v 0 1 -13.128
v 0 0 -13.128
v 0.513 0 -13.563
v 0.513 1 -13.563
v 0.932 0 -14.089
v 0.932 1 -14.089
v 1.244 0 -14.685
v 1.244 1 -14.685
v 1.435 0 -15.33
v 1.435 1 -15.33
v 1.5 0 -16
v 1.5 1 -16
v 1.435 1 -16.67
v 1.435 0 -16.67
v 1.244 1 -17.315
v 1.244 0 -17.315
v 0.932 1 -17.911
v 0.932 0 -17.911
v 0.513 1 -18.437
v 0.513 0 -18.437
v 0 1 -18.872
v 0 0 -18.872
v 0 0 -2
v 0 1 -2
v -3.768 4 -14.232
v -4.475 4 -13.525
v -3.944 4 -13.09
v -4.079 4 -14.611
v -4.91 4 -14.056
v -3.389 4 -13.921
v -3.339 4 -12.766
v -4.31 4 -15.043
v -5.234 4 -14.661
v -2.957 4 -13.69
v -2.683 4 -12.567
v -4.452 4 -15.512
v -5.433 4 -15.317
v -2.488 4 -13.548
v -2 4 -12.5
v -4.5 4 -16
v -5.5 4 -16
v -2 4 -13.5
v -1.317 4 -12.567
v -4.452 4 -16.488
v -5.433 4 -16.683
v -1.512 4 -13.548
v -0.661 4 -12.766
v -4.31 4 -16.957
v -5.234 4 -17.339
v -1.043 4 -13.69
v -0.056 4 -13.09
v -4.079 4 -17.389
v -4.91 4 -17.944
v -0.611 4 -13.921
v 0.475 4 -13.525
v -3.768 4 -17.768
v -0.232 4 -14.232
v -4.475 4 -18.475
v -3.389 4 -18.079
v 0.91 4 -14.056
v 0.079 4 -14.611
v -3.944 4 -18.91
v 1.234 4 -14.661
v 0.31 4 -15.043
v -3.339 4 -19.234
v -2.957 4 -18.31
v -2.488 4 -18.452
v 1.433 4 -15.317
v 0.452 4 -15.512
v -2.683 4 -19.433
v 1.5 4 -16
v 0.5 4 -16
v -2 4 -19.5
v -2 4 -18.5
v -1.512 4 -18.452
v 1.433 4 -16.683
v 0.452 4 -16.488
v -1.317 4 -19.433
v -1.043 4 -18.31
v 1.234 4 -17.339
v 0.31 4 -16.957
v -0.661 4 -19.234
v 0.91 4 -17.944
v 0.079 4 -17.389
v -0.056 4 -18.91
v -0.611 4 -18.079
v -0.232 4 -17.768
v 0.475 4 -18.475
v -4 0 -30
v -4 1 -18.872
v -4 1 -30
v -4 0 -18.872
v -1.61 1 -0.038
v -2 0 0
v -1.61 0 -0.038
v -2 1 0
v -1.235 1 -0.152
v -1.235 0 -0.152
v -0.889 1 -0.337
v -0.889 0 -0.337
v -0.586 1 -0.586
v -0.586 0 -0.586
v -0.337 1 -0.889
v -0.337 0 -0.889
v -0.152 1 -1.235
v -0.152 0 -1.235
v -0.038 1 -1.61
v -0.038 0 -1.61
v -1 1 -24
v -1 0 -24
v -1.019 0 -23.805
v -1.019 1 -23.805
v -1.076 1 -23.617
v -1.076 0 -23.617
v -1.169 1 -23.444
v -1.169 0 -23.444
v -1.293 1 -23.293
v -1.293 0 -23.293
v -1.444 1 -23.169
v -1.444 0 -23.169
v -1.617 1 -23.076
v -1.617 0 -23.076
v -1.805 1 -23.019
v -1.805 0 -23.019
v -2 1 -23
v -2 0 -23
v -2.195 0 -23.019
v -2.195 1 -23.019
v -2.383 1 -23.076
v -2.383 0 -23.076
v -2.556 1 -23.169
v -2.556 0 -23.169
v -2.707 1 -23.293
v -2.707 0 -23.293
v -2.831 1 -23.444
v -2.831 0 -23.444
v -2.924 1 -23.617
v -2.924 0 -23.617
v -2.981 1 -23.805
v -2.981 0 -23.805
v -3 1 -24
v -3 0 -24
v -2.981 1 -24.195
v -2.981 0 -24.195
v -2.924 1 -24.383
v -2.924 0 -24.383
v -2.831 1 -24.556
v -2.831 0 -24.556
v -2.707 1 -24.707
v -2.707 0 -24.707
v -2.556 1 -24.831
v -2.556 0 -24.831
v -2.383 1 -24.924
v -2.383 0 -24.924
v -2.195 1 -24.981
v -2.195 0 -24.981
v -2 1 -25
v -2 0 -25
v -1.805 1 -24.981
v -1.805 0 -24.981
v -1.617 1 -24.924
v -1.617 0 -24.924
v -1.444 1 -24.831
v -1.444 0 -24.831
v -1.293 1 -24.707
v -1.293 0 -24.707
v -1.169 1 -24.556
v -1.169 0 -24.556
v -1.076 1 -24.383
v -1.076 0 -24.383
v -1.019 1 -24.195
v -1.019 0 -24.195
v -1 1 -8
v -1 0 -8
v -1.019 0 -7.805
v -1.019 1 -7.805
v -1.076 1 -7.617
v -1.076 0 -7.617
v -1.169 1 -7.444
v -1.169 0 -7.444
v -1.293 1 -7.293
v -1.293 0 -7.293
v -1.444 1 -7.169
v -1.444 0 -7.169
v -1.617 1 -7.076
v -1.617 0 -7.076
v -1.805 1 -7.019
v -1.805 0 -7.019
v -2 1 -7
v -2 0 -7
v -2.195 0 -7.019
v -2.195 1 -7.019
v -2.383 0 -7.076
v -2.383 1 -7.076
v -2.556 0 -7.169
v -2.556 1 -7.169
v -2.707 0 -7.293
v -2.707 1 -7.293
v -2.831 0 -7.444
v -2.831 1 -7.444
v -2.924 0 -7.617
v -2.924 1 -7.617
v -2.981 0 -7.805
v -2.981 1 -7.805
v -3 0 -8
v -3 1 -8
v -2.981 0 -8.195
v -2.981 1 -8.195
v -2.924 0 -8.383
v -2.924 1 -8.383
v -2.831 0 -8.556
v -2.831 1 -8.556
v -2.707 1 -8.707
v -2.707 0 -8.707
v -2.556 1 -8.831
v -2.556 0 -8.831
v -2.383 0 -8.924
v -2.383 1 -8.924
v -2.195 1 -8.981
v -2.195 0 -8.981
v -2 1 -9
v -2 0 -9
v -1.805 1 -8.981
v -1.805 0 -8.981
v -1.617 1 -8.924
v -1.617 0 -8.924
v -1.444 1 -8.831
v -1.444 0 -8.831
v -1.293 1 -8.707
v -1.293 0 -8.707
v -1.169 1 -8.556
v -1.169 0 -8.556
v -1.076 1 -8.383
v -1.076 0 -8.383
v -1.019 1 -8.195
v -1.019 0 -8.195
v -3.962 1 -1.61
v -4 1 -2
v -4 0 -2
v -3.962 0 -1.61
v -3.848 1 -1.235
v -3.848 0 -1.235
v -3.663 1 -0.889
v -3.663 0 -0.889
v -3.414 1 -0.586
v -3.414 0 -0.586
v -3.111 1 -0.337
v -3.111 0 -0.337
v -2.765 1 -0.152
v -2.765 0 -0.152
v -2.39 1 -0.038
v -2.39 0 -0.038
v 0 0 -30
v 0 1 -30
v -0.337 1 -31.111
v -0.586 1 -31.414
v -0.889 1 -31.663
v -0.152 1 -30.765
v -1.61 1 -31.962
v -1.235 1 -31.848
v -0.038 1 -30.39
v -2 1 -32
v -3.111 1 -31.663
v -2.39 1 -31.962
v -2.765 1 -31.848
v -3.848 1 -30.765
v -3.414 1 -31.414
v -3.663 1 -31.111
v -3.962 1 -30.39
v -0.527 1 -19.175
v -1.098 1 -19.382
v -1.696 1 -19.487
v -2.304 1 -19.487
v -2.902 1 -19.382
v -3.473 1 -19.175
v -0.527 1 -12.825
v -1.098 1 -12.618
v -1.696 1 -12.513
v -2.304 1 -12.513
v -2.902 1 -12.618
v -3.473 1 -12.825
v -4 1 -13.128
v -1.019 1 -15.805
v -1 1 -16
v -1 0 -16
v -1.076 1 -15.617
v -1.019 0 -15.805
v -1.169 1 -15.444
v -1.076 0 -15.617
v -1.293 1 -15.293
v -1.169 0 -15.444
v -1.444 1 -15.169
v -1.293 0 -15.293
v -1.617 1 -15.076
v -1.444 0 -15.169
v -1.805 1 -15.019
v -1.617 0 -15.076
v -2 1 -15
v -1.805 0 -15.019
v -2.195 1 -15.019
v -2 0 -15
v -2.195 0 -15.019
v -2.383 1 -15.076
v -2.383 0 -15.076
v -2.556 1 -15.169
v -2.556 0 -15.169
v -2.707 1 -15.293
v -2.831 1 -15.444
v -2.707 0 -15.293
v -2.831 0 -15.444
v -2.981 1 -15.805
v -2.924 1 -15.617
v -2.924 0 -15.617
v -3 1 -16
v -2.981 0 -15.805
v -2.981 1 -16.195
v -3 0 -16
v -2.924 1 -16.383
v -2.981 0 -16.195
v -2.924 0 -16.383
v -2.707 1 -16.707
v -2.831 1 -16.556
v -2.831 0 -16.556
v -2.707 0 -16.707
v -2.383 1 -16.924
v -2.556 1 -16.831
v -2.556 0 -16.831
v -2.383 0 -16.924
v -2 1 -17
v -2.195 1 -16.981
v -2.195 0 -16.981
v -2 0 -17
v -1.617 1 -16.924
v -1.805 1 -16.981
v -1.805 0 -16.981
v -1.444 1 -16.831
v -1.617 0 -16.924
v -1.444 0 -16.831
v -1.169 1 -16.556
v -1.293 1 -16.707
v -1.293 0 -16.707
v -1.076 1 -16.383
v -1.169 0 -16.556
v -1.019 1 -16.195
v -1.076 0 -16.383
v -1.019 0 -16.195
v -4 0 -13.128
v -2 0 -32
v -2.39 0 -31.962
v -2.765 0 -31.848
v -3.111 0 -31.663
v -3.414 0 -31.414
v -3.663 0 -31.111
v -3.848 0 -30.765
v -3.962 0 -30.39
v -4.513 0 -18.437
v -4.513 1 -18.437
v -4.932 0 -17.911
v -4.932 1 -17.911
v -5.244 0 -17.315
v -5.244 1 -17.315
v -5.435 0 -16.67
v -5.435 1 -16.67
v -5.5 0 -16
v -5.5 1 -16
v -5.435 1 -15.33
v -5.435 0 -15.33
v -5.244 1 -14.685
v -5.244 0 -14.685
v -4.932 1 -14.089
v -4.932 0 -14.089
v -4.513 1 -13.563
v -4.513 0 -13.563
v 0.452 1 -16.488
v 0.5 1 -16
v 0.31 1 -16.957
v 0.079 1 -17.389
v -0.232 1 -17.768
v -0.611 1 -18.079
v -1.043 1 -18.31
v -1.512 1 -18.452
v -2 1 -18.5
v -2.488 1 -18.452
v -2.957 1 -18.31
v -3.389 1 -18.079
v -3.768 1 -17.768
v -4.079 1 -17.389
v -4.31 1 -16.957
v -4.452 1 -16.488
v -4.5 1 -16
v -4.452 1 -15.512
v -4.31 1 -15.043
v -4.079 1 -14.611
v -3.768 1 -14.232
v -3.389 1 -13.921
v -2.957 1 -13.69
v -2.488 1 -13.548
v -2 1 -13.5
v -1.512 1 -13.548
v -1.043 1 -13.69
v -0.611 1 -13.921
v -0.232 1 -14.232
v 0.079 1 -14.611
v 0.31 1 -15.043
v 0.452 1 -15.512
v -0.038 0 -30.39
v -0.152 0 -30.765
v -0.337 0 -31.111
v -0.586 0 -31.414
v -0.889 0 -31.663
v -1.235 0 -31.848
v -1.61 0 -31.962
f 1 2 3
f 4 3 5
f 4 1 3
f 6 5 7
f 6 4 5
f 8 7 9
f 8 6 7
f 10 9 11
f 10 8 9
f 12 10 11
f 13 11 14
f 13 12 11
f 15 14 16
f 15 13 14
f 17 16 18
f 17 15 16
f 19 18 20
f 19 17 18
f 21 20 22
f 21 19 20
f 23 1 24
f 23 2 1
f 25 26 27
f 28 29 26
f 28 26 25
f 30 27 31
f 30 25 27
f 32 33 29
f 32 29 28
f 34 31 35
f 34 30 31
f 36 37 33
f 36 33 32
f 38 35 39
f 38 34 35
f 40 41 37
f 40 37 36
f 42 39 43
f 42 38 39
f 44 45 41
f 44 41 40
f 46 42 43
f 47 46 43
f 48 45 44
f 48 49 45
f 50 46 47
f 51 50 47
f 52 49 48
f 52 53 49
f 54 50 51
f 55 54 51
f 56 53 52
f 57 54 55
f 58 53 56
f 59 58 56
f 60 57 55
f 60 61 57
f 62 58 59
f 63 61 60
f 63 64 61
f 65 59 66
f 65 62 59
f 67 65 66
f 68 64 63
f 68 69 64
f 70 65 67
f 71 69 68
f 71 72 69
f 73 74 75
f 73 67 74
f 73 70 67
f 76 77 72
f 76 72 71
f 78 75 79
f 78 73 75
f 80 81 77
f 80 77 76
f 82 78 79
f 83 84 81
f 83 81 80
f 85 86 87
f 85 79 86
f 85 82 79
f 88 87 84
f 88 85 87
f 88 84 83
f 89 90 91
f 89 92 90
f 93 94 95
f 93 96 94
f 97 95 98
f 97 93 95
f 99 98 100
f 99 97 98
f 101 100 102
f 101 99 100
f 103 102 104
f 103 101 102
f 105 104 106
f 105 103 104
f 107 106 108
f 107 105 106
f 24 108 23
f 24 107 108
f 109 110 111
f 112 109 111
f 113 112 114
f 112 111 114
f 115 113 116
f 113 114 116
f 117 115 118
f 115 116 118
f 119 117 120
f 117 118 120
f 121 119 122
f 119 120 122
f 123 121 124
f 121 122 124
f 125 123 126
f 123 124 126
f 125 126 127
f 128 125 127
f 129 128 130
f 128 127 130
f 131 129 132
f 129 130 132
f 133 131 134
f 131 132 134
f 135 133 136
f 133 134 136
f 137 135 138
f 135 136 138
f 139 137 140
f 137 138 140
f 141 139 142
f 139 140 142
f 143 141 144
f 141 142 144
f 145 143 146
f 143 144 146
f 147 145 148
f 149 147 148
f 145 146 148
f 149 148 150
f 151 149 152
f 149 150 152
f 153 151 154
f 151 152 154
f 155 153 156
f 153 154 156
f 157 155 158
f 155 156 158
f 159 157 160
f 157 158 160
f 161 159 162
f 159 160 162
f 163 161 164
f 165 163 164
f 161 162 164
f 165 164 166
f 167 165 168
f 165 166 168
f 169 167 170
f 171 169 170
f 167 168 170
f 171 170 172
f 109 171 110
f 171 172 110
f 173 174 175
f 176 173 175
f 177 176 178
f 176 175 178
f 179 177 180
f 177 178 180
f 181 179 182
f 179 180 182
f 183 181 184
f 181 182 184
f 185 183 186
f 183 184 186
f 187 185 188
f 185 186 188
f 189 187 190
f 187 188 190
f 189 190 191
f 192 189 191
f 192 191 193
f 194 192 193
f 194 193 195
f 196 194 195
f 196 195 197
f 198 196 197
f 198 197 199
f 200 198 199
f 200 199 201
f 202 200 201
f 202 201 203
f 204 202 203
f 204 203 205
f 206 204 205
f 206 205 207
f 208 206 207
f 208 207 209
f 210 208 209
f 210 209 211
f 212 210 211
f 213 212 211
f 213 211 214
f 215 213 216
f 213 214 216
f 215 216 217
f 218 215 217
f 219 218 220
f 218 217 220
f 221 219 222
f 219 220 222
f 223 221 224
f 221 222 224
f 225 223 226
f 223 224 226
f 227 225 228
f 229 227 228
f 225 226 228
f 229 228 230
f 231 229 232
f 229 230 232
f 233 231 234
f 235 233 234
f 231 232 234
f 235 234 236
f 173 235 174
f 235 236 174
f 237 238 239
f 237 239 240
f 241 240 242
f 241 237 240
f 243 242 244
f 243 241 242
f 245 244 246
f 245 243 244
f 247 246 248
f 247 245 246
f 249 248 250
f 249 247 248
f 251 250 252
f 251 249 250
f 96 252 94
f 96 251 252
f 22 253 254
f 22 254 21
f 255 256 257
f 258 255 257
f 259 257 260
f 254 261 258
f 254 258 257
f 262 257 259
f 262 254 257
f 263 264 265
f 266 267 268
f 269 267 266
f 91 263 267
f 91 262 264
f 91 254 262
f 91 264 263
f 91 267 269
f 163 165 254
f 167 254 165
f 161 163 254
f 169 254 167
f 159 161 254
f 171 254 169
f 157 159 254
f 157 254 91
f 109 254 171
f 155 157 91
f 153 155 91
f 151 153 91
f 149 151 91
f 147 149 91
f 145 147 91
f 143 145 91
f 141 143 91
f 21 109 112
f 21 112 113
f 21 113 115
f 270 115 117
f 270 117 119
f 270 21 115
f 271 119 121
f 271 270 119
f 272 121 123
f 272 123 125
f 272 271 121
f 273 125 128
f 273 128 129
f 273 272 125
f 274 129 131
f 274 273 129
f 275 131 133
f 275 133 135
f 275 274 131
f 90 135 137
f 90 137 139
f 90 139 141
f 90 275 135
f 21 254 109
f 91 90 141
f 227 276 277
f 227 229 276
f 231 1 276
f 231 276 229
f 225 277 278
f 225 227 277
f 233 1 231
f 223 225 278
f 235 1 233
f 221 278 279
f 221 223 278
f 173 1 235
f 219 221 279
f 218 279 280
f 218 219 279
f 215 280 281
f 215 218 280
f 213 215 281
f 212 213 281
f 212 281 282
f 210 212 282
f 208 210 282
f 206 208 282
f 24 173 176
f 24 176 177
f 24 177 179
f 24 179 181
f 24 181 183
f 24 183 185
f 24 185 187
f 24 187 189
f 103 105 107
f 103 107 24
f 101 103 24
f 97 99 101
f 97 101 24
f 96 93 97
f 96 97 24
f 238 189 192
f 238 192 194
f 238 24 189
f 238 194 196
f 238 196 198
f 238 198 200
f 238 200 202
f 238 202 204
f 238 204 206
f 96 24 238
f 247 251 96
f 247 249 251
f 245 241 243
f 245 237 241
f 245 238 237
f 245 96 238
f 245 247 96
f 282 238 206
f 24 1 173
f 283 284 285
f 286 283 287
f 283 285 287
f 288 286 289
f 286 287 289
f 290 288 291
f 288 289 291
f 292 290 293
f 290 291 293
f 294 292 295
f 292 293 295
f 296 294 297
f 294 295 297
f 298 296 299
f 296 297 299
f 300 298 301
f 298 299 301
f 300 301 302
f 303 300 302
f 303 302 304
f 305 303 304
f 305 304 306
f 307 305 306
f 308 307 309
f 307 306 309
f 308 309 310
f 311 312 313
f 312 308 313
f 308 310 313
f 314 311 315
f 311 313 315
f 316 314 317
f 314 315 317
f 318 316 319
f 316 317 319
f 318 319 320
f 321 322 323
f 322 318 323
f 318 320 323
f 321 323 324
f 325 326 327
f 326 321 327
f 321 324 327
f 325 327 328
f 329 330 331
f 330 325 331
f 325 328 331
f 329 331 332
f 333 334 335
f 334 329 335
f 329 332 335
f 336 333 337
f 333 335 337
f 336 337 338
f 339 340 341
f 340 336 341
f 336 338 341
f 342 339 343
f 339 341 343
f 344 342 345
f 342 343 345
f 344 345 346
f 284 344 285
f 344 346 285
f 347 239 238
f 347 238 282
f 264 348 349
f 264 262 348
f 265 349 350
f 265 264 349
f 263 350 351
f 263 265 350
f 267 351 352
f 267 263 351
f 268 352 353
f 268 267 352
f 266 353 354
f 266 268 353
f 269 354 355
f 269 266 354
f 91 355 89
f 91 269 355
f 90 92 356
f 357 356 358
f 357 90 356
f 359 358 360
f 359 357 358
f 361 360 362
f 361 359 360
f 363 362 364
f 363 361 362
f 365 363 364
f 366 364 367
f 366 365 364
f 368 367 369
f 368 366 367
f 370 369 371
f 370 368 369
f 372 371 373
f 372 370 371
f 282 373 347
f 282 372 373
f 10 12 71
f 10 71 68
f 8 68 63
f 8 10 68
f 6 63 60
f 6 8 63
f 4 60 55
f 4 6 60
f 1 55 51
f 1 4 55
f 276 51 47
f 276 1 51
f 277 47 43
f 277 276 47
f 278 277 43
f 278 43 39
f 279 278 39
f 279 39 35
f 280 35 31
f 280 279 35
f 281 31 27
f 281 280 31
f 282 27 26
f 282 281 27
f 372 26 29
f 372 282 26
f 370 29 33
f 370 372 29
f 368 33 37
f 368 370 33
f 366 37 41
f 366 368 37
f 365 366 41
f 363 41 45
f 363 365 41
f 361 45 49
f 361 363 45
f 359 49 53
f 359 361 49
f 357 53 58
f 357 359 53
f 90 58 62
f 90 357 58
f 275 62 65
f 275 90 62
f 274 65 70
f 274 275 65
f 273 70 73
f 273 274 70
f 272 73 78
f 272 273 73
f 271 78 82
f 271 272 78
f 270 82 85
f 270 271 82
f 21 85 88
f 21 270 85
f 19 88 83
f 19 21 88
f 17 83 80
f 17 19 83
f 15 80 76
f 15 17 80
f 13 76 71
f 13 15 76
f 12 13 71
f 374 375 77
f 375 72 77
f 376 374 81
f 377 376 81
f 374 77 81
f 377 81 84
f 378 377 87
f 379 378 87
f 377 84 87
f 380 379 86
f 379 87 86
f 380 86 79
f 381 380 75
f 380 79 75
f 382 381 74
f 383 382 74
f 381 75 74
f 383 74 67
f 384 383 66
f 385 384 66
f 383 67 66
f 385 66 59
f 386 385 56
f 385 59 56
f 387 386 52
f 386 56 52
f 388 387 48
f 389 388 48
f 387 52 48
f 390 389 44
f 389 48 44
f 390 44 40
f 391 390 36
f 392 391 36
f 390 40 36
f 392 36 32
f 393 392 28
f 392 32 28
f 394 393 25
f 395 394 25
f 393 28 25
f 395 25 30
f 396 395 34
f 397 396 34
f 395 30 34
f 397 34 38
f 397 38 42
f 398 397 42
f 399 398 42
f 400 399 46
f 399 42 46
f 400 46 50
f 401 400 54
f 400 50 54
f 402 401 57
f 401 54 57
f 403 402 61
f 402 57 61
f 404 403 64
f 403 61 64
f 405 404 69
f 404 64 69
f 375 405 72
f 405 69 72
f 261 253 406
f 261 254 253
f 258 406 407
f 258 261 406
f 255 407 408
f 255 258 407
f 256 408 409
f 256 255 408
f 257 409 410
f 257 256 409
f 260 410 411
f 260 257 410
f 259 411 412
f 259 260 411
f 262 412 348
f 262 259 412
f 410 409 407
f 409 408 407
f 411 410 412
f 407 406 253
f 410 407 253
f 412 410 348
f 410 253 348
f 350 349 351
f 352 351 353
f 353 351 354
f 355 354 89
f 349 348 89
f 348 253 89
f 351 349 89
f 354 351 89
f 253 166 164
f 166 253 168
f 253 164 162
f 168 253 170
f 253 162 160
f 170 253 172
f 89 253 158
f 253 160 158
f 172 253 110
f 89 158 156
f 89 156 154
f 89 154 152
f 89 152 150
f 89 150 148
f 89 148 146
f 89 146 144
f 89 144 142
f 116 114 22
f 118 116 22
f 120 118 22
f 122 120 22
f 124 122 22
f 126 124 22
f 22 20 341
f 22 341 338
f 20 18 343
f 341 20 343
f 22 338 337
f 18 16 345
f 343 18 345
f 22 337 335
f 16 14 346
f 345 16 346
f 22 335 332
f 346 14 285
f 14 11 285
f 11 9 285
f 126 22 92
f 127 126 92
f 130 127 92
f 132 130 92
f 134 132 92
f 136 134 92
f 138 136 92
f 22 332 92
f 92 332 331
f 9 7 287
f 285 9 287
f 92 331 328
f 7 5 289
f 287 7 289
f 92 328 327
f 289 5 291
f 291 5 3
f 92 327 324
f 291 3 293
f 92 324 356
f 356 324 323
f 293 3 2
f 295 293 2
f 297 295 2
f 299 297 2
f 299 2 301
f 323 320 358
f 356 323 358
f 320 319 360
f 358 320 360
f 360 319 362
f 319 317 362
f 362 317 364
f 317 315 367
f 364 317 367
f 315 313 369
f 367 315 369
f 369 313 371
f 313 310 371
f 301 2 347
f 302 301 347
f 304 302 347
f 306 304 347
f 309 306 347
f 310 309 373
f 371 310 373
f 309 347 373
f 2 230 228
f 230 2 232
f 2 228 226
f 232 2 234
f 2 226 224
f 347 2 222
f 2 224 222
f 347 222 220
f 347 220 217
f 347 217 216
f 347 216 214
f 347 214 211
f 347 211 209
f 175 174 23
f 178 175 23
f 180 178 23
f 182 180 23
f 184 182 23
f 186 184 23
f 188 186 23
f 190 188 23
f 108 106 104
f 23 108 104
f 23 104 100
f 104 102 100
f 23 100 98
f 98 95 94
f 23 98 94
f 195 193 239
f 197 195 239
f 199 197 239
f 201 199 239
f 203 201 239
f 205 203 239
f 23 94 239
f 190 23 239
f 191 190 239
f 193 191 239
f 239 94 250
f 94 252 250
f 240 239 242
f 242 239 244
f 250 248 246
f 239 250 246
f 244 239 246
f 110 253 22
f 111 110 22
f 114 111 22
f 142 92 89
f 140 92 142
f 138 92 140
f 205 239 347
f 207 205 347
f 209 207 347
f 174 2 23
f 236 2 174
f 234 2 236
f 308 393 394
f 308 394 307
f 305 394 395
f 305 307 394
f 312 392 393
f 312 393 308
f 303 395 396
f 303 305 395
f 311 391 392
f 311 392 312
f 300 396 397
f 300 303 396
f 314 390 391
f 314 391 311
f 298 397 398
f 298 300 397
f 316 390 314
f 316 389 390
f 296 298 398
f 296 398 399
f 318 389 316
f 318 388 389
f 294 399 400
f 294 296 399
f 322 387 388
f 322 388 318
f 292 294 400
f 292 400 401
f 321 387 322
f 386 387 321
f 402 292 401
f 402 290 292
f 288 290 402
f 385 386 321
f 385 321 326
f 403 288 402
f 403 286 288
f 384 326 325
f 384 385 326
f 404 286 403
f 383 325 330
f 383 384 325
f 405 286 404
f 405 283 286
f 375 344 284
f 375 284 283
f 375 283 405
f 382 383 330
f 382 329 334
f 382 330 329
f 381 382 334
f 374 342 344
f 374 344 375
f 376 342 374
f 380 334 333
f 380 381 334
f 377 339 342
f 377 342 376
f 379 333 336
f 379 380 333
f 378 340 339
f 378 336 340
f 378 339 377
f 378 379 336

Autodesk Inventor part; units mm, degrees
ref_plane "YZ Plane" through (0, 0, 0) normal (1, 0, 0) x (0, 1, 0)
ref_plane "XZ Plane" through (0, 0, 0) normal (0, 1, 0) x (-1, 0, 0)
ref_plane "XY Plane" through (0, 0, 0) normal (0, 0, 1) x (1, 0, 0)
sketch "Sketch1" plane through (0, 0, 0) normal (0, 1, 0) x (-1, 0, 0)
  line L0 (0, 0) -> (4, 0)
  line L1 (4, 0) -> (4, -32)
  line L2 (4, -32) -> (0, -32)
  line L3 (0, -32) -> (0, 0)
  dimension "d0" = 4
  dimension "d1" = 32
extrude "Extrusion1" add sketch "Sketch1" along normal blind 1
fillet "Fillet1" radius 2 4 edges at (0, 0.5, 0) (-4, 0.5, 0) (0, 0.5, -32) (-4, 0.5, -32)
sketch "Sketch2" plane through (0, 1, 0) normal (0, 1, 0) x (1, 0, 0)
  circle A0 centre (-2, 16) radius 3.5
  arc A1 (-4, 2) -> (0, 2) centre (-2, 2) ccw projected
  line L0 (0, 2) -> (0, 30) projected
  point P0 (0, 0)
  point P1 (-2, 0)
  dimension "d5" = 7
  dimension "d6" = 16
  dimension "d7" = 2
extrude "Extrusion2" add sketch "Sketch2" along normal blind 3
sketch "Sketch3" plane through (0, 1, 0) normal (0, -1, 0) x (1, 0, 0)
  line L0 (0, -13.1277) -> (0, -18.8723) projected
  arc A0 (0, -18.8723) -> (0, -13.1277) centre (-2, -16) ccw projected
  line L1 (-4, -18.8723) -> (-4, -13.1277) projected
  arc A1 (-4, -13.1277) -> (-4, -18.8723) centre (-2, -16) ccw projected
  arc A2 (0, -18.8723) -> (0, -13.1277) centre (-2, -16) ccw
  arc A3 (-4, -13.1277) -> (-4, -18.8723) centre (-2, -16) ccw
  line L2 (-4, -13.1277) -> (-4, -18.8723)
  line L3 (-4, -30) -> (-4, -2) projected
  line L4 (0, -13.1277) -> (0, -18.8723)
  line L5 (0, -2) -> (0, -30) projected
  point P0 (0, 0)
extrude "Extrusion3" add sketch "Sketch3" along normal blind 1
sketch "Sketch4" plane through (0, 0, 0) normal (0, -1, 0) x (1, 0, 0)
  arc A0 (-4, -30) -> (0, -30) centre (-2, -30) ccw projected
  line L0 (0, -18.8723) -> (0, -30) projected
  arc A1 (0, -18.8723) -> (0, -13.1277) centre (-2, -16) ccw projected
  line L1 (0, -2) -> (0, -13.1277) projected
  arc A2 (0, -2) -> (-4, -2) centre (-2, -2) ccw projected
  line L2 (-4, -13.1277) -> (-4, -2) projected
  arc A3 (-4, -13.1277) -> (-4, -18.8723) centre (-2, -16) ccw projected
  line L3 (-4, -30) -> (-4, -18.8723) projected
  circle A4 centre (-2, -16) radius 1
  point P0 (0, 0)
  dimension "d12" = 2
extrude "Extrusion4" cut sketch "Sketch4" against normal through all contours A4
sketch "Sketch5" plane through (-2, 4, -16) normal (0, 1, 0) x (1, 0, 0)
  circle A0 centre (0, 0) radius 1 projected
  circle A1 centre (0, 0) radius 2.5
  point P0 (2, -16)
  dimension "d15" = 5
extrude "Extrusion5" cut sketch "Sketch5" against normal blind 3
sketch "Sketch6" plane through (0, 0, 0) normal (0, -1, 0) x (1, 0, 0)
  circle A0 centre (-2, -8) radius 1
  circle A1 centre (-2, -24) radius 1
  circle A2 centre (-2, -16) radius 1 projected
  point P0 (0, 0)
  dimension "d18" = 2
  dimension "d19" = 2
  dimension "d20" = 16
  dimension "d21" = 8
extrude "Extrusion6" cut sketch "Sketch6" against normal through all contours A0 | A1
properties part number "ServoWings"
